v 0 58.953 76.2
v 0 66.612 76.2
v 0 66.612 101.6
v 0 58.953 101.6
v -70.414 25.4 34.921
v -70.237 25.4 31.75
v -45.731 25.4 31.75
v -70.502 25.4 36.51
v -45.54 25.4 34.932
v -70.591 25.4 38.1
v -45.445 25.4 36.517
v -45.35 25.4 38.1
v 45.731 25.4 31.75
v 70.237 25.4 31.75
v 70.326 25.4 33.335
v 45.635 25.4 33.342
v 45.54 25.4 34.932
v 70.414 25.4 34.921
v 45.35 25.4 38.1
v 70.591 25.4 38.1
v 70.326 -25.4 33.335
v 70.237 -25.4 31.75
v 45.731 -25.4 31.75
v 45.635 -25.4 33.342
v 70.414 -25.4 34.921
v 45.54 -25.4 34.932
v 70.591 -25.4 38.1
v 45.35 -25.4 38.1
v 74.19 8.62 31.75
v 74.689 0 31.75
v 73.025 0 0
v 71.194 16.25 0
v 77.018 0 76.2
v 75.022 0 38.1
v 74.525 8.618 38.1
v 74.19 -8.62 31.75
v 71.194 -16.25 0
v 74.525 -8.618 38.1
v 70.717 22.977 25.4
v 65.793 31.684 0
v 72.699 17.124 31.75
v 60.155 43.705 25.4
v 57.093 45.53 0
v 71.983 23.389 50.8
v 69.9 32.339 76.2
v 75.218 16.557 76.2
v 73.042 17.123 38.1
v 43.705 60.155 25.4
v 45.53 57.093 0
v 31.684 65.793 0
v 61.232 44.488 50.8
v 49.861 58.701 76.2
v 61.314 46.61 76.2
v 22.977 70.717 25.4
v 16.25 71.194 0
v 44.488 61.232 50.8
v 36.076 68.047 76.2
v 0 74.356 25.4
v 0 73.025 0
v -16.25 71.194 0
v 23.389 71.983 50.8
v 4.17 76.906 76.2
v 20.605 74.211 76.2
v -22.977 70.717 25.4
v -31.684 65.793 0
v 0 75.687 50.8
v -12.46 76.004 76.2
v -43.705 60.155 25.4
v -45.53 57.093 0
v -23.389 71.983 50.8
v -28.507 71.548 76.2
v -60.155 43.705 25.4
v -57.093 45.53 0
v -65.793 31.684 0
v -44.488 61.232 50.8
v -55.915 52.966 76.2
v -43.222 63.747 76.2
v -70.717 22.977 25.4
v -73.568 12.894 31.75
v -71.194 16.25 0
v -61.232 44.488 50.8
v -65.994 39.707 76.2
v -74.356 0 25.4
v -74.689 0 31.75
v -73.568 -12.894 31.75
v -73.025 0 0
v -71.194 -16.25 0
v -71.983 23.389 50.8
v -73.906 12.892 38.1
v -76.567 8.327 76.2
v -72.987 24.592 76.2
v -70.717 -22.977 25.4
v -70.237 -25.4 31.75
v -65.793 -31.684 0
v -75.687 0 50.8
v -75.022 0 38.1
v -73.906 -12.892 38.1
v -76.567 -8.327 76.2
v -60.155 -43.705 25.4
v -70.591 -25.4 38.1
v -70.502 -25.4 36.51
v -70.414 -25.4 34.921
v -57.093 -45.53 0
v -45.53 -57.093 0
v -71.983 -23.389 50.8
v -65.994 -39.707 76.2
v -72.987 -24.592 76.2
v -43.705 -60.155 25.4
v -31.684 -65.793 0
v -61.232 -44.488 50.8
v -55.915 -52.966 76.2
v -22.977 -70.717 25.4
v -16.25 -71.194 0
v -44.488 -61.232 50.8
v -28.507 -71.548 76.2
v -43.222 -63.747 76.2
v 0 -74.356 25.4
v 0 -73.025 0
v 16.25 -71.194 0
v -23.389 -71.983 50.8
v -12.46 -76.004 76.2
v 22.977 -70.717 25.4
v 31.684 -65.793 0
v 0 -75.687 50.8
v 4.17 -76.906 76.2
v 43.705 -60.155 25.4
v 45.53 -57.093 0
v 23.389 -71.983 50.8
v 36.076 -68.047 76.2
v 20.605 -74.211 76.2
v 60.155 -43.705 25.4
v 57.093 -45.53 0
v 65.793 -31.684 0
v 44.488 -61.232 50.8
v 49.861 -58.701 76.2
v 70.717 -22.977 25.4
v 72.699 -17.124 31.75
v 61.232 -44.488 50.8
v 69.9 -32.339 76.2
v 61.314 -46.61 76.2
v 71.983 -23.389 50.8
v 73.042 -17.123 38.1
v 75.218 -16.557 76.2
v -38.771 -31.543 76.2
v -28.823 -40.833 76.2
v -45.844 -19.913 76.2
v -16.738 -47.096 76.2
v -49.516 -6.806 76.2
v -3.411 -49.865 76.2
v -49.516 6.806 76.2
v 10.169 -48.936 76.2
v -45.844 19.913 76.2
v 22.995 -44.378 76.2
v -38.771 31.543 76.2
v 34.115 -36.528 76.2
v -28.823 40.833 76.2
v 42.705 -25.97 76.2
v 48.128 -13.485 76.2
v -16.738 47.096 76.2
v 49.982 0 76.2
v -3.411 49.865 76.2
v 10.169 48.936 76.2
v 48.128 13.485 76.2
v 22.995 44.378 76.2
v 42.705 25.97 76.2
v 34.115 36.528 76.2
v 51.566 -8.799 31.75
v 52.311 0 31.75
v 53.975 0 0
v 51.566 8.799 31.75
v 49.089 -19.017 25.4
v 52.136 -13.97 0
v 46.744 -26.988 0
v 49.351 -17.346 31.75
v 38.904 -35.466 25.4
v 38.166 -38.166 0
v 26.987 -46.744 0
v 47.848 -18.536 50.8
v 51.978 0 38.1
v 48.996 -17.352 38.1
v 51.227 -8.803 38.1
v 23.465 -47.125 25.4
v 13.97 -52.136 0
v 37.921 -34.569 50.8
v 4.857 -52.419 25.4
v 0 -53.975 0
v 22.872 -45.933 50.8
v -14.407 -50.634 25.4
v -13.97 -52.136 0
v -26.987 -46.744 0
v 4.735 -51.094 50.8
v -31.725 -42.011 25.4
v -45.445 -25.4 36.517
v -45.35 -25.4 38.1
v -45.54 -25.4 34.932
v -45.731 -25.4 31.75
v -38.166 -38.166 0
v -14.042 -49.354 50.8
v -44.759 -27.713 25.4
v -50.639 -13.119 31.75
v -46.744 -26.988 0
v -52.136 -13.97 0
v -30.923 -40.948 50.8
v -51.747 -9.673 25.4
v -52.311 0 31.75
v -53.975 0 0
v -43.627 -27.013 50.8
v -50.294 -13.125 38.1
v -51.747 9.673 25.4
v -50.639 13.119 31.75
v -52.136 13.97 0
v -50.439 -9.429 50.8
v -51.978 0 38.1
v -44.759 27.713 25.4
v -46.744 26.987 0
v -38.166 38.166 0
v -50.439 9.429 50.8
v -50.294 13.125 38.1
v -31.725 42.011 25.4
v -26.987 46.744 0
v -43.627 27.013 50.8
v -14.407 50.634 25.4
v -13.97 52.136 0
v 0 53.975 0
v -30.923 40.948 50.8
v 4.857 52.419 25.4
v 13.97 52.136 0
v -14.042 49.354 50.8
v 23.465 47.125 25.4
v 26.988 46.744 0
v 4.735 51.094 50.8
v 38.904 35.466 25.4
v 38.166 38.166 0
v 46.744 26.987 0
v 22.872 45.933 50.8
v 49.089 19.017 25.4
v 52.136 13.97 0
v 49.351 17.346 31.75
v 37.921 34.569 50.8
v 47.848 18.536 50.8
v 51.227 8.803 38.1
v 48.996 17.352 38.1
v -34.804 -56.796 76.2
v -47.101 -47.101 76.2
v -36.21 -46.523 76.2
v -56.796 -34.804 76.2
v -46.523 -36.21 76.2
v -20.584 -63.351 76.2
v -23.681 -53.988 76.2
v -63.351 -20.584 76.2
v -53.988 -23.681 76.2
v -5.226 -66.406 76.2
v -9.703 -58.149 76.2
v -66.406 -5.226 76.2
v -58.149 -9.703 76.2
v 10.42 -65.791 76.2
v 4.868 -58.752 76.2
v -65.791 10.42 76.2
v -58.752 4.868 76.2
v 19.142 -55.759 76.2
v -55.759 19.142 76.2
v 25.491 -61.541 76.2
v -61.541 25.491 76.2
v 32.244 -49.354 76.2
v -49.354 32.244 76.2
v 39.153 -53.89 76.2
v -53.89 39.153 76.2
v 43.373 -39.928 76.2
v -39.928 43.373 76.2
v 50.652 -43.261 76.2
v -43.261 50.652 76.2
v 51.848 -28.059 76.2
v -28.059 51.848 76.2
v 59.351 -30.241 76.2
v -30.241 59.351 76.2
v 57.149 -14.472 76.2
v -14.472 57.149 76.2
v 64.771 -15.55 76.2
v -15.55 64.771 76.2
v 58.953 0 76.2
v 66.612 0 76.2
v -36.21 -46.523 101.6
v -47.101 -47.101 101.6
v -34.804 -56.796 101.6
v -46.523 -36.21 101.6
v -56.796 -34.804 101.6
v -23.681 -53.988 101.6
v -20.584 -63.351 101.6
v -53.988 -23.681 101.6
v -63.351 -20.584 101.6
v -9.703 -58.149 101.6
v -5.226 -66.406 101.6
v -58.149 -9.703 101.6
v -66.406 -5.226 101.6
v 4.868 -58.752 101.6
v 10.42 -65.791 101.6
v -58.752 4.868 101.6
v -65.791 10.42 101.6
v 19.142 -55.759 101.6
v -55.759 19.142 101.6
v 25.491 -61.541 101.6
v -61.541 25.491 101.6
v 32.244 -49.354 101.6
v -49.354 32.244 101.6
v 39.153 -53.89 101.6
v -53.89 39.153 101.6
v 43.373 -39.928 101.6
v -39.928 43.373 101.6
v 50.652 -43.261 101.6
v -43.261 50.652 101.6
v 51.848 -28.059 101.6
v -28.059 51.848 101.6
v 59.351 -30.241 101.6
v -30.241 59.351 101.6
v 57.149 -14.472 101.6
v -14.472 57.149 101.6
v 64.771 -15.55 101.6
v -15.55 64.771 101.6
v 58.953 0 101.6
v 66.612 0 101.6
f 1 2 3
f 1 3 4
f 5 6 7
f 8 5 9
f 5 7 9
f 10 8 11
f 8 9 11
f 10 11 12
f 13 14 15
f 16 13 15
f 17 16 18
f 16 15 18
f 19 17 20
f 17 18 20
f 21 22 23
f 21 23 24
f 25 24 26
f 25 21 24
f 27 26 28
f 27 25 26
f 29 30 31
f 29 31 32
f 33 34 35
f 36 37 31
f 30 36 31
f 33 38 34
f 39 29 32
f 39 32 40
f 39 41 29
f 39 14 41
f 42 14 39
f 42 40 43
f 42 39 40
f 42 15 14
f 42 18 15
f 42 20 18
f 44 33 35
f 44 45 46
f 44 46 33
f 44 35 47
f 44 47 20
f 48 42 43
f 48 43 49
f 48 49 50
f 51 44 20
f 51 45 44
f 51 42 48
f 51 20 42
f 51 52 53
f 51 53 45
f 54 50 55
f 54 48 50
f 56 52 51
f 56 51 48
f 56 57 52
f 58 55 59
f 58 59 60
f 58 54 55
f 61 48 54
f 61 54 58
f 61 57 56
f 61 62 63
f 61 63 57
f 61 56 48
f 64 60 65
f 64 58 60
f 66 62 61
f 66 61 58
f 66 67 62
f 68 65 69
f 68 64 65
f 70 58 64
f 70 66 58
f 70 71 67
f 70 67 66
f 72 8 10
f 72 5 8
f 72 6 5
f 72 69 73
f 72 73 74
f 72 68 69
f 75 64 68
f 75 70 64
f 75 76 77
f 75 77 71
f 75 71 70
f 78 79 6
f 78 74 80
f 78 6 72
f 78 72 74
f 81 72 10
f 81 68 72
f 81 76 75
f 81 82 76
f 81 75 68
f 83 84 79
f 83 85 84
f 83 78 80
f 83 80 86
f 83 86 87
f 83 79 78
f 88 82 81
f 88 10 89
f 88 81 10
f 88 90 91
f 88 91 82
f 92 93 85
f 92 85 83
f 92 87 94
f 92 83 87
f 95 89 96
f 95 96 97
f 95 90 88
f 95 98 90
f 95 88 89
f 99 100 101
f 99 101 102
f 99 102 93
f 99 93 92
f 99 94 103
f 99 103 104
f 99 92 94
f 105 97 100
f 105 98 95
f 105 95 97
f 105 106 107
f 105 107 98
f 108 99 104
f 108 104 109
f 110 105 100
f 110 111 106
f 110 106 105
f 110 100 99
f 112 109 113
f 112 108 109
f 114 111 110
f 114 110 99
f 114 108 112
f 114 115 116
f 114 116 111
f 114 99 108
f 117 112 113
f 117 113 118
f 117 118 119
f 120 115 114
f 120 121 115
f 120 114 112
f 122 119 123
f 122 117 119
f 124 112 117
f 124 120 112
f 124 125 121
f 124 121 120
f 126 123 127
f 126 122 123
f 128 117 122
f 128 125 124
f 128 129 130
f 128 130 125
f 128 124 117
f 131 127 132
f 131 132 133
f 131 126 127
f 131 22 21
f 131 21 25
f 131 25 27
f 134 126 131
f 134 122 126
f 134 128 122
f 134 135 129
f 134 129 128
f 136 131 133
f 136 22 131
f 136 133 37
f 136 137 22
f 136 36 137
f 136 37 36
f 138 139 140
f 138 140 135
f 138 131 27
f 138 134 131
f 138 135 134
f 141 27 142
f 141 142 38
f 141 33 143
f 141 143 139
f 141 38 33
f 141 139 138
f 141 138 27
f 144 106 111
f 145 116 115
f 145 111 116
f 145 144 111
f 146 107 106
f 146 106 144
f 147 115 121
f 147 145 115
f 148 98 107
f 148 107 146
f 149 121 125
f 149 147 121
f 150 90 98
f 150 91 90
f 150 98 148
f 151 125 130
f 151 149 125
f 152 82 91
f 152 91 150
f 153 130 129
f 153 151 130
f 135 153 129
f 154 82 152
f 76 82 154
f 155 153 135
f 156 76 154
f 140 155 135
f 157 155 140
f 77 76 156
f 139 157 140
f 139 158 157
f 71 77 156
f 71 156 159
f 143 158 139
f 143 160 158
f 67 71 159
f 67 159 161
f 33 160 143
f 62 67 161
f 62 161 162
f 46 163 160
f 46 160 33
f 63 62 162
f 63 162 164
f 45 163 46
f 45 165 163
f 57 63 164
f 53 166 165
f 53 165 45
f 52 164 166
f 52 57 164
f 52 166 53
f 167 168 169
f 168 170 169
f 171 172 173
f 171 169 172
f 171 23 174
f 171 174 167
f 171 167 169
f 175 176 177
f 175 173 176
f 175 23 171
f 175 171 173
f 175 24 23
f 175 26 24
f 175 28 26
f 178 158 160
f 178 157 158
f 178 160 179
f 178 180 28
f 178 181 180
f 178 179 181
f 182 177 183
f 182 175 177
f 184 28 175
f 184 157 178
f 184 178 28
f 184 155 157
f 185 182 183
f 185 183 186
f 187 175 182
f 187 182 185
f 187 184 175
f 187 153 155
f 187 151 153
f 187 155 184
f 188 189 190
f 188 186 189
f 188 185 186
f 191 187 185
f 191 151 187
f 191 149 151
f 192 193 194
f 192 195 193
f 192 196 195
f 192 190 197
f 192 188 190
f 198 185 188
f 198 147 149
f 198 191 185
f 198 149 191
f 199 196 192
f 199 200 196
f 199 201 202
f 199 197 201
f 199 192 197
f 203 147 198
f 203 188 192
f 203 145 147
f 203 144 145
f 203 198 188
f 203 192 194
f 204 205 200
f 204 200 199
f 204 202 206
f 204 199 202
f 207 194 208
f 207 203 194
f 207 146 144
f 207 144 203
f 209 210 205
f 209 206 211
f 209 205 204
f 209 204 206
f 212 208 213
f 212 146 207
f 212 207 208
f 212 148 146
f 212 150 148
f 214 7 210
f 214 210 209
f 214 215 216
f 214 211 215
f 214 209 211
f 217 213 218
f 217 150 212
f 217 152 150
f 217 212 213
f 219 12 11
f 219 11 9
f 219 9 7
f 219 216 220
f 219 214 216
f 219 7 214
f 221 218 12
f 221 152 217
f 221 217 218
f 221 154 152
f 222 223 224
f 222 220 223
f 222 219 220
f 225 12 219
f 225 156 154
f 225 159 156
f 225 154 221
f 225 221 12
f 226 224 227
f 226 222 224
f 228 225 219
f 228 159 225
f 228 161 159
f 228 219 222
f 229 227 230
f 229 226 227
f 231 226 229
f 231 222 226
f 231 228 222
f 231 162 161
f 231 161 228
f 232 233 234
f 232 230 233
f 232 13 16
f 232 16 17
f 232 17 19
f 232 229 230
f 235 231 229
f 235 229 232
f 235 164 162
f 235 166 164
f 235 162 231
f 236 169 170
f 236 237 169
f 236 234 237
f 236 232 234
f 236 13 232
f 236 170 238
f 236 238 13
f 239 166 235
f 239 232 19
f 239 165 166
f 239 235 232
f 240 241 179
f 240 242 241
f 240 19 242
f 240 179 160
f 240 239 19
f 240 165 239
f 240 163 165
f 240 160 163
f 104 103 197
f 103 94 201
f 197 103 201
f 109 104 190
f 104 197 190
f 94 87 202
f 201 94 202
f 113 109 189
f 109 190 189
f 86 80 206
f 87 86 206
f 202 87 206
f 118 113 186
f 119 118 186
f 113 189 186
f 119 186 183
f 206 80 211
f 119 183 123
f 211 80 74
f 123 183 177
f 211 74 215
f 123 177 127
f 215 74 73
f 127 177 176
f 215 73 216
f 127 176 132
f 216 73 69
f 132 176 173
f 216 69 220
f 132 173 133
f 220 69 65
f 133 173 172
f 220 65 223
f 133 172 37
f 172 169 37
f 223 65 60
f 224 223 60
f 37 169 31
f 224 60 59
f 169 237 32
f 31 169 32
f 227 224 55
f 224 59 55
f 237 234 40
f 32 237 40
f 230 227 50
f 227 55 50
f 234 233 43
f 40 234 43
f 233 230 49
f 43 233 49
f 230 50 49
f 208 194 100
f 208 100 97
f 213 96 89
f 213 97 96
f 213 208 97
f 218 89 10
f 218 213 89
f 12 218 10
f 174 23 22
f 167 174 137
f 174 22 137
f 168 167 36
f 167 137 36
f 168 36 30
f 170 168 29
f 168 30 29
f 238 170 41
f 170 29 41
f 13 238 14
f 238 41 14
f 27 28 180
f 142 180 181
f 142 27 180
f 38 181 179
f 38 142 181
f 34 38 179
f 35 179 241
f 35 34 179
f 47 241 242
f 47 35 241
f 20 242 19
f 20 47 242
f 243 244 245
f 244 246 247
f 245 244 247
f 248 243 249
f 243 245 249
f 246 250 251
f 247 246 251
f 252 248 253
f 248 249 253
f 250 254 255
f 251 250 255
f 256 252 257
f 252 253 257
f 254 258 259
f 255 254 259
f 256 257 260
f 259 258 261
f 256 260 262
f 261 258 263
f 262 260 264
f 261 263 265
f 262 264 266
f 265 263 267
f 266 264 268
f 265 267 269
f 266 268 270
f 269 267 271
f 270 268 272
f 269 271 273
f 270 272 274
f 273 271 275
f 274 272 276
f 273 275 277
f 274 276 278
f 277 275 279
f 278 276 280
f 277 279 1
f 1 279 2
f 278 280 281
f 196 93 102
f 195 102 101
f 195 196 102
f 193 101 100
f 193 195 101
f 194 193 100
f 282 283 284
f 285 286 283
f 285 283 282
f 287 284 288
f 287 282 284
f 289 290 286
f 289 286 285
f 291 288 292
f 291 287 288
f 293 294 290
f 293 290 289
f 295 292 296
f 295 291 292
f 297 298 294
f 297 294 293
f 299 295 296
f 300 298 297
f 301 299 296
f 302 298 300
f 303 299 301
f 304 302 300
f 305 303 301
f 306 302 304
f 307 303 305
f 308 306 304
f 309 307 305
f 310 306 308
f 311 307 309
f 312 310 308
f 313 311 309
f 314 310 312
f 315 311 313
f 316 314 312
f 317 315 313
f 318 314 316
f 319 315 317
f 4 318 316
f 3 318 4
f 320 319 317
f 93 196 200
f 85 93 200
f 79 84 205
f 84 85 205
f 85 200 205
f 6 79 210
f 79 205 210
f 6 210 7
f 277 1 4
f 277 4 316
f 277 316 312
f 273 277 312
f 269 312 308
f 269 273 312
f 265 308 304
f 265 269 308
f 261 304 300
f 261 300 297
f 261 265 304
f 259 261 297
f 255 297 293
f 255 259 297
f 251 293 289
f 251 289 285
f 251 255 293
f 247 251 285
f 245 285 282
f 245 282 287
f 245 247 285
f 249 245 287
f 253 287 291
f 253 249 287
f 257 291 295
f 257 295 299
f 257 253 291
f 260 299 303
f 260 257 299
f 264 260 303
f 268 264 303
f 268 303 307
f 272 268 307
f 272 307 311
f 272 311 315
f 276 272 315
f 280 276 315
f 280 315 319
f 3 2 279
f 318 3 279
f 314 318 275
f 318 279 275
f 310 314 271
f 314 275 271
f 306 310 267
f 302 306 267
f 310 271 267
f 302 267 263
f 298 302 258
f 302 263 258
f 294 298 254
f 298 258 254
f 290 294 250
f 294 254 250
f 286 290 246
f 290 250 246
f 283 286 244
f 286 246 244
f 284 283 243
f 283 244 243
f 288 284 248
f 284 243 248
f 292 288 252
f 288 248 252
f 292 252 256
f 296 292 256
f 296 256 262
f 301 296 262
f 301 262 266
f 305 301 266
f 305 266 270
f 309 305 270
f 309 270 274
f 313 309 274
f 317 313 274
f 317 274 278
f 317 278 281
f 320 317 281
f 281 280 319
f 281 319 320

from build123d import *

# Parameters (mm, degrees)
F0_R     = 73.025
F0_R_2   = 53.975
F1_DEPTH = 76.2
F1_TAPER = -3
F2_R     = 66.6115
F2_R_2   = 58.9534
F3_DEPTH = 25.4
F5_DEPTH = 25.4
F6_W     = 50.8
F6_H     = 6.35
F7_DEPTH = 127


with BuildPart() as f1:
    # F0 (on Top) → F1 (new body)
    with BuildSketch(Plane.XY):
        Circle(F0_R)
        Circle(F0_R_2, mode=Mode.SUBTRACT)
    extrude(amount=F1_DEPTH, taper=F1_TAPER)

    # F6 (on Right) → F7 (cut, symmetric)
    with BuildSketch(Plane.YZ):
        with Locations((0, 34.925)):
            Rectangle(F6_W, F6_H)
    extrude(amount=F7_DEPTH, both=True, mode=Mode.SUBTRACT)


with BuildPart() as f3:
    # F2 (on face) → F3 (new body)
    with BuildSketch(Plane.XY.offset(76.2)):
        Circle(F2_R)
        Circle(F2_R_2, mode=Mode.SUBTRACT)
    extrude(amount=F3_DEPTH)

    # F4 (on face) → F5 (cut)
    with BuildSketch(Plane.XY.offset(101.6)):
        with BuildLine():
            ThreePointArc((0, 58.9534), (41.686348914, 41.686348914), (58.9534, 0))
            Line((58.9534, 0), (66.6115, 0))
            ThreePointArc((66.6115, 0), (47.101443355, 47.101443355), (0, 66.6115))
            Line((0, 66.6115), (0, 58.9534))
        make_face()
    extrude(amount=-F5_DEPTH, mode=Mode.SUBTRACT)


solid = Compound([f1.part, f3.part])
